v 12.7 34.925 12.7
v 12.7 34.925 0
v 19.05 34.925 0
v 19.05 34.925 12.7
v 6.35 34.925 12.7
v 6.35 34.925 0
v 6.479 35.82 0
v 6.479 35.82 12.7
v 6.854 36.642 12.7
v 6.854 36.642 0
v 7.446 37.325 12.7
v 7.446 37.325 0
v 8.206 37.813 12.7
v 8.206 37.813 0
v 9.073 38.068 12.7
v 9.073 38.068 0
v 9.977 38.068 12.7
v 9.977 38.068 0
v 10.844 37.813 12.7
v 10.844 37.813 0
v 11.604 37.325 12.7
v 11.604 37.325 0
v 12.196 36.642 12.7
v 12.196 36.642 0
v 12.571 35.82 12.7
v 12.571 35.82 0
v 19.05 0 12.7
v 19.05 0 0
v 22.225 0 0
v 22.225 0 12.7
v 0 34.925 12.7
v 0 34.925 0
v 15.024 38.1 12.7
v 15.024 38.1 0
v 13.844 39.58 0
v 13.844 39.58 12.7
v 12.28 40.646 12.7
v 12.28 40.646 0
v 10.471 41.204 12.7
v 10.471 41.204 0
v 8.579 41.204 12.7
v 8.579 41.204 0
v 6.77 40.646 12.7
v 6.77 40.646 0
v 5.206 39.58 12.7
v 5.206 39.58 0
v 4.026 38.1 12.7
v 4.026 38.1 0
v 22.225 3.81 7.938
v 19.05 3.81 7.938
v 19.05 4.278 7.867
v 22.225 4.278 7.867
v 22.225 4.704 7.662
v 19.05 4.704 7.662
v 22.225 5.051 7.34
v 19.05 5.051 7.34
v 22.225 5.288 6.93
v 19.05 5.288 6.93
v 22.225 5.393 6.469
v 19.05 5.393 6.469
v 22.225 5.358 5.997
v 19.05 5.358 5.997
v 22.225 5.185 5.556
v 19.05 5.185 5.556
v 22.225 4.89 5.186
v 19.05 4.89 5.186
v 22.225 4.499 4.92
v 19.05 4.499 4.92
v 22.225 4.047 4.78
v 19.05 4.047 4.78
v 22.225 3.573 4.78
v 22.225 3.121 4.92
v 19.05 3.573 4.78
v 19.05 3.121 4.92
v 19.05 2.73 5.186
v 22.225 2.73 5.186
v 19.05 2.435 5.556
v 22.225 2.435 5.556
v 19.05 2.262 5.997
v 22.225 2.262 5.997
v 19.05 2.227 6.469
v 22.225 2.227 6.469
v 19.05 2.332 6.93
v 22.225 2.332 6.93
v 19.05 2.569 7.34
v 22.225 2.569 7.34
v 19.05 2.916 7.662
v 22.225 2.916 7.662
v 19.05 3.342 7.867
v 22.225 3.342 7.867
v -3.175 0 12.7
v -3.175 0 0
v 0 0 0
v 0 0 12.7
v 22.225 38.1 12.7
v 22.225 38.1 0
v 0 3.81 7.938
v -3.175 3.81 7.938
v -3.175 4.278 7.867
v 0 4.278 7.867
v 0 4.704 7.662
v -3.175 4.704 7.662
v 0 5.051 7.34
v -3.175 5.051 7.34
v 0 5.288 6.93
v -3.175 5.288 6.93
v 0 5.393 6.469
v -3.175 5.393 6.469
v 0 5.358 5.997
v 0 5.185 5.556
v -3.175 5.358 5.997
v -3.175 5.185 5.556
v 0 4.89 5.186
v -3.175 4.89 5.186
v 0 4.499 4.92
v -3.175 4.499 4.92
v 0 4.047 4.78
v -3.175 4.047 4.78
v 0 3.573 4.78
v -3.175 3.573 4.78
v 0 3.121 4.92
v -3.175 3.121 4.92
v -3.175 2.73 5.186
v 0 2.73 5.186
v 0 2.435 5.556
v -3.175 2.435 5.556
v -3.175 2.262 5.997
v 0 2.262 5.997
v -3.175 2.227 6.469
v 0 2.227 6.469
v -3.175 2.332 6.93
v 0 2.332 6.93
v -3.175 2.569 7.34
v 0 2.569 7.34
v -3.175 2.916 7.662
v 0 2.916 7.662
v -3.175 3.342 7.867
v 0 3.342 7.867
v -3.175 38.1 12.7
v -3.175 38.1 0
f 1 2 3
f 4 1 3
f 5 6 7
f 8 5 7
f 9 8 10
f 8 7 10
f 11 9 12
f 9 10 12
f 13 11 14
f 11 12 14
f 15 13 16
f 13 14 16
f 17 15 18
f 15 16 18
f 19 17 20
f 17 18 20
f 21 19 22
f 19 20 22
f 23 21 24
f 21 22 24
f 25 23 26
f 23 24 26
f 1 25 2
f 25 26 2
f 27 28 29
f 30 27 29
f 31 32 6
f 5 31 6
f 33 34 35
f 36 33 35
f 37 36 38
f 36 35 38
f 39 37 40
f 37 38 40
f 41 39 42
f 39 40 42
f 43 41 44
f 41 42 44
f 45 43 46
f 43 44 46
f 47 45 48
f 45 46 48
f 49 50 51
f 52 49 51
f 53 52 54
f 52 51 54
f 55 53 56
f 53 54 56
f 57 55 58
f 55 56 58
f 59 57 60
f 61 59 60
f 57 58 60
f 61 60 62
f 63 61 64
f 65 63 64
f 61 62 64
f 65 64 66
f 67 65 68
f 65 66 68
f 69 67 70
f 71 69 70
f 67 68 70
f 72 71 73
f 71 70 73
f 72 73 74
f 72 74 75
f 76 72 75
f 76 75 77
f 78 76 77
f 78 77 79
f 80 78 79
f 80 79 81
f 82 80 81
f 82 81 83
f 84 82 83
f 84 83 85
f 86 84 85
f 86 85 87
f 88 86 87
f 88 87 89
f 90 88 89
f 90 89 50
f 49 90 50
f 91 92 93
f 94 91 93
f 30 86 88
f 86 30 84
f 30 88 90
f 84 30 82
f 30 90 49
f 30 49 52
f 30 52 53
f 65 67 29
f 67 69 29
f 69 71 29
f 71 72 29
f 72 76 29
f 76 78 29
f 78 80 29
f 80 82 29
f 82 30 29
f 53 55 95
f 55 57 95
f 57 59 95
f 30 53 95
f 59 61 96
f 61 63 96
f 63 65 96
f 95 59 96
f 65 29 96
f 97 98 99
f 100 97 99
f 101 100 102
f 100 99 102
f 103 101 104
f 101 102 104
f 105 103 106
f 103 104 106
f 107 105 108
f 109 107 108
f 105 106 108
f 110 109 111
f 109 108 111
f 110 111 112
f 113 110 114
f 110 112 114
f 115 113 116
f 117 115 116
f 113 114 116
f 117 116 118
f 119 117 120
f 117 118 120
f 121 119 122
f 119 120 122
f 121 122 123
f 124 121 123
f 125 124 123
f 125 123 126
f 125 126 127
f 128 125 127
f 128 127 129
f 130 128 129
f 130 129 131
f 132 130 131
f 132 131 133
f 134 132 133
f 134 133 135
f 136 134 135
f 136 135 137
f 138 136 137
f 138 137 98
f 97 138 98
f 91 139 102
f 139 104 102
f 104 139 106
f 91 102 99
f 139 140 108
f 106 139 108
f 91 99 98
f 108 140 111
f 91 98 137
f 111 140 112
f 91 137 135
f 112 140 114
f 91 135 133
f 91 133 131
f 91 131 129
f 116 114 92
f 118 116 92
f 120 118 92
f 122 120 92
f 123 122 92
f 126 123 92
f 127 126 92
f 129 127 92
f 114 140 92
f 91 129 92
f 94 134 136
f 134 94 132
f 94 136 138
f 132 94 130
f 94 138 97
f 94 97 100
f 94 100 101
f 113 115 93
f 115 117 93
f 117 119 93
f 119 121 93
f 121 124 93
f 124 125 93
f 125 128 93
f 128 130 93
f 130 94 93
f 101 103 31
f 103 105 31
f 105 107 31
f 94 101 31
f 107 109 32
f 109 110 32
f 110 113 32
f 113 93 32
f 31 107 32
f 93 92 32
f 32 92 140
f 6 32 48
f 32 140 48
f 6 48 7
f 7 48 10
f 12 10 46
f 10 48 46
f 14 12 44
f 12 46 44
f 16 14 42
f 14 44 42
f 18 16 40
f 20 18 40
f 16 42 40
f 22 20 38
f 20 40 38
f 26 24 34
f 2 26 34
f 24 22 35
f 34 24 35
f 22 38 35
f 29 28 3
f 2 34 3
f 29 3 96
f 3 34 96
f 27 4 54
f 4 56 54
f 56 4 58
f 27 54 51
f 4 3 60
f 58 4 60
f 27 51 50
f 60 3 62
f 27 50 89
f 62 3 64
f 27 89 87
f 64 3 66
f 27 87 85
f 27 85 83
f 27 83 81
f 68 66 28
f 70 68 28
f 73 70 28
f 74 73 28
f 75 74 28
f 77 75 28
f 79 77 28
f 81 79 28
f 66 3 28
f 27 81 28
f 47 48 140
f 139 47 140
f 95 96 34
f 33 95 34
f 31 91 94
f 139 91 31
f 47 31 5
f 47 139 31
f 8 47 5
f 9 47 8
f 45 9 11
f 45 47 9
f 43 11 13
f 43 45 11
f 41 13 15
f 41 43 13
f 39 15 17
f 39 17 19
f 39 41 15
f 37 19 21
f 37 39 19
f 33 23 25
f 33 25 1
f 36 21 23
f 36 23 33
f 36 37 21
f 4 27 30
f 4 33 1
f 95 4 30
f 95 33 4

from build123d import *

# Parameters (mm, degrees)
BOSS_EXTRUDE1_DEPTH = 12.7
SKETCH2_R           = 1.5875
CUT_EXTRUDE1_DEPTH  = 76.2


with BuildPart() as part:
    # Sketch1 → Boss-Extrude1 (new body)
    with BuildSketch(Plane.XY):
        with BuildLine():
            Line((0, 0), (0, 34.925))
            Line((0, 34.925), (6.35, 34.925))
            ThreePointArc((6.35, 34.925), (9.525, 38.1), (12.7, 34.925))
            Line((12.7, 34.925), (19.05, 34.925))
            Line((19.05, 34.925), (19.05, 0))
            Line((19.05, 0), (22.225, 0))
            Line((22.225, 0), (22.225, 38.1))
            Line((22.225, 38.1), (15.024261314, 38.1))
            ThreePointArc((15.024261314, 38.1), (9.525, 41.275), (4.025738686, 38.1))
            Line((4.025738686, 38.1), (-3.175, 38.1))
            Line((-3.175, 38.1), (-3.175, 0))
            Line((-3.175, 0), (0, 0))
        make_face()
    extrude(amount=BOSS_EXTRUDE1_DEPTH)

    # Sketch2 → Cut-Extrude1 (cut)
    with BuildSketch(Plane.ZY.offset(3.175)):
        with Locations((6.35, 3.81)):
            Circle(SKETCH2_R)
    extrude(amount=-CUT_EXTRUDE1_DEPTH, mode=Mode.SUBTRACT)


solid = part.part
